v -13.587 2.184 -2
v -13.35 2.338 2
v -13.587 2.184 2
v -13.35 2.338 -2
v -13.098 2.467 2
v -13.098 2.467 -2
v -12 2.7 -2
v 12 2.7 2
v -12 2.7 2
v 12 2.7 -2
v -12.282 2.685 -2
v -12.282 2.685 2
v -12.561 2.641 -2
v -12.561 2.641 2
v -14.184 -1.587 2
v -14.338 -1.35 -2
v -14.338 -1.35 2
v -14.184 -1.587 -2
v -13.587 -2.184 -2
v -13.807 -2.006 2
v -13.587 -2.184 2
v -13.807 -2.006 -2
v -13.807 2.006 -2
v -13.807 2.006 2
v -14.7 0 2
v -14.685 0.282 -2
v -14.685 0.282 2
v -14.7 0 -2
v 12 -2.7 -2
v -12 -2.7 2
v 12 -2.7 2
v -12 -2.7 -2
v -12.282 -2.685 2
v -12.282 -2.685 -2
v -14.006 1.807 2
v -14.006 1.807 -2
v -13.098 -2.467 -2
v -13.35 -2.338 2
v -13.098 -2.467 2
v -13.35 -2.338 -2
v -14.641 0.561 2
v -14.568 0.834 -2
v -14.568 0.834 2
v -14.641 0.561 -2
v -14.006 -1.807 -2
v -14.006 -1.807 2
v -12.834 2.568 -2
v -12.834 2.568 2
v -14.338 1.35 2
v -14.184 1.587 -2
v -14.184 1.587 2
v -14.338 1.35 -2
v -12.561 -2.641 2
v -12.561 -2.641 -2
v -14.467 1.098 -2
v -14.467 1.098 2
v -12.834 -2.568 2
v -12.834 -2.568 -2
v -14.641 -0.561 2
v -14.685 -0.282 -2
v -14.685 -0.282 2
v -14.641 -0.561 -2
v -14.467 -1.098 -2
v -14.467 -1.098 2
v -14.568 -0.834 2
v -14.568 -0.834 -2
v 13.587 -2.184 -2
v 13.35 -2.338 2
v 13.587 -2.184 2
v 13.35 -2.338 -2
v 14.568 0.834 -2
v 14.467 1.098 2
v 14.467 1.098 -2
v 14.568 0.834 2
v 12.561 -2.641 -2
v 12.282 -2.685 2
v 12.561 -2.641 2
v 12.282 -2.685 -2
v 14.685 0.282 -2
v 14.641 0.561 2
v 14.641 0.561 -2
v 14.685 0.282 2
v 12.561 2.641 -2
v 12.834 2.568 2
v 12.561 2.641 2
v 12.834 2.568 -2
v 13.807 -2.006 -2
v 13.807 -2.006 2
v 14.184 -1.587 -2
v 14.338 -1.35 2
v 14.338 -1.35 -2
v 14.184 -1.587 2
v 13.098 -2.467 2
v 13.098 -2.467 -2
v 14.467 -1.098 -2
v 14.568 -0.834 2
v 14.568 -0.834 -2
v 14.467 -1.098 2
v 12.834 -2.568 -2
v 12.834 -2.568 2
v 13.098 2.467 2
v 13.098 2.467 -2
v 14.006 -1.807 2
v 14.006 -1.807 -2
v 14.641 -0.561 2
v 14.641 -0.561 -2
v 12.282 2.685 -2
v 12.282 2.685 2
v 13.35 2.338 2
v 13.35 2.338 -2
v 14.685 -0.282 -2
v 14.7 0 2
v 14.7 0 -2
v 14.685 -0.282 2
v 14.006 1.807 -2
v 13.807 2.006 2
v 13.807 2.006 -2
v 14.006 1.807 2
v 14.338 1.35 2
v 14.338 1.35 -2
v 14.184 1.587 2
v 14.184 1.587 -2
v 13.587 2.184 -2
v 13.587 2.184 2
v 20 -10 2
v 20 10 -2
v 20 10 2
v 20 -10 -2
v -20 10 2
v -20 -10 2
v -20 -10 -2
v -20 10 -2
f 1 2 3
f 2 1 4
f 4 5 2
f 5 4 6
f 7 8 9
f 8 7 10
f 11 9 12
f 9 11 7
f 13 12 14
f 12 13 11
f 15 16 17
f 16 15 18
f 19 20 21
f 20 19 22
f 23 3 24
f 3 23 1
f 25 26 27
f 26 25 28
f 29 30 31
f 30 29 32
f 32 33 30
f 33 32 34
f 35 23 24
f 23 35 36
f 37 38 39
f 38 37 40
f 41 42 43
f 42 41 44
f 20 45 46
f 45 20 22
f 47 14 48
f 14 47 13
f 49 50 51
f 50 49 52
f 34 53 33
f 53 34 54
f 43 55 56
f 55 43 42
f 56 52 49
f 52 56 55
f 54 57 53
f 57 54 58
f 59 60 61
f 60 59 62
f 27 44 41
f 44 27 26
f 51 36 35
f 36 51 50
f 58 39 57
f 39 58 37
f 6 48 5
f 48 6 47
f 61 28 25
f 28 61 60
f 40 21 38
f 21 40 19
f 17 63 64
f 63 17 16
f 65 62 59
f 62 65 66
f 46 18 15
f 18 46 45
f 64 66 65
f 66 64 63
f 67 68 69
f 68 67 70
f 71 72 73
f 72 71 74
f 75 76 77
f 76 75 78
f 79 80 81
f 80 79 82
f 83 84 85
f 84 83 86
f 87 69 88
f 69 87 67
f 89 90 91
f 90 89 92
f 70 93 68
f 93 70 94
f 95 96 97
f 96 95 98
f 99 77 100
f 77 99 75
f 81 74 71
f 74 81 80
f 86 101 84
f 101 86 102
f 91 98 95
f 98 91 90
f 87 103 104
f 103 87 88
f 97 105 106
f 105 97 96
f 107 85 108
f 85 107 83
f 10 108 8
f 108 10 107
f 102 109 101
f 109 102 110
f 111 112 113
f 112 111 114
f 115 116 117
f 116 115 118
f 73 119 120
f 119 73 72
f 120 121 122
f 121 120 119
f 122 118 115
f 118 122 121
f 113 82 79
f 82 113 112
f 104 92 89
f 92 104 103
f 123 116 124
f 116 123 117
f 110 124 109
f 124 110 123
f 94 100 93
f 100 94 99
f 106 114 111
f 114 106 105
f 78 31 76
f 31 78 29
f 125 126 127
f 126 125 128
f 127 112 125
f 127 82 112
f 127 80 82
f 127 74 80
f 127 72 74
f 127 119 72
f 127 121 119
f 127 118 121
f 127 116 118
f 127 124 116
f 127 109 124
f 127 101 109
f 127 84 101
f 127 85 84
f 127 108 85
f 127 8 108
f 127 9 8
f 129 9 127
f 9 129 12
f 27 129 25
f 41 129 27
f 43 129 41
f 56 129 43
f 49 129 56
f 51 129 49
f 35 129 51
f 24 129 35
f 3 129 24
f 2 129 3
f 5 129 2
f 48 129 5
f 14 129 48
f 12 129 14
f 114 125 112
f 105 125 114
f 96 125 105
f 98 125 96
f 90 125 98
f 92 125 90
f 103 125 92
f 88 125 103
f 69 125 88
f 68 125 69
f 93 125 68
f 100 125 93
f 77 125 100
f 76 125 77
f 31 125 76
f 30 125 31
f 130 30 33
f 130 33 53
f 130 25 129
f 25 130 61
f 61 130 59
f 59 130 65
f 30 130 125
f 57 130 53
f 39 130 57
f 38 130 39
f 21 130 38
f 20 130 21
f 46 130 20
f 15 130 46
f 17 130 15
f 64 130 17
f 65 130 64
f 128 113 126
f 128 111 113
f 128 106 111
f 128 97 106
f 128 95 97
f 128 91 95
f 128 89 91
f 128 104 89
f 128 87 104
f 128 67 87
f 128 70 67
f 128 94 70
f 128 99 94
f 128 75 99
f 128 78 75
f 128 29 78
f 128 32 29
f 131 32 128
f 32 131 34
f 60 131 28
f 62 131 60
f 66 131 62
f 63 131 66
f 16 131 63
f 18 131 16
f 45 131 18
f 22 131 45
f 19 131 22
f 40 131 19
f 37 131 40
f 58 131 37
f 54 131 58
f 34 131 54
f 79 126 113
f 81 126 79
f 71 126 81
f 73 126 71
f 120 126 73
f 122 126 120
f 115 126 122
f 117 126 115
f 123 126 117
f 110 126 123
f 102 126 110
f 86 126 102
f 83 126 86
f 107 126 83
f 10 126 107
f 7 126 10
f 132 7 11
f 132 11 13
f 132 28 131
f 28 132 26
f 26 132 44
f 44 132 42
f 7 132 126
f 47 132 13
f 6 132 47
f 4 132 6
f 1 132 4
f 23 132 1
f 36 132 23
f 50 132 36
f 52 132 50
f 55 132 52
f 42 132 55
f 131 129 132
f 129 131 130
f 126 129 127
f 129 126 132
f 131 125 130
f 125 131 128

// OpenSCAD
// Slotted mounting plate.
$fn = 60;
eps = 0.02;
plate_l = 40;
plate_w = 20;
plate_t = 4;
slot_l = 12;
slot_d = 5.4;
module slot(x) { hull() { translate([x-slot_l/2,0,-plate_t/2-eps]) cylinder(d=slot_d,h=plate_t+2*eps); translate([x+slot_l/2,0,-plate_t/2-eps]) cylinder(d=slot_d,h=plate_t+2*eps); } }
difference() { cube([plate_l, plate_w, plate_t], center=true); for (i=[0:1]) slot(-plate_l/2+14+i*(plate_l-28)/max(1,1)); }
